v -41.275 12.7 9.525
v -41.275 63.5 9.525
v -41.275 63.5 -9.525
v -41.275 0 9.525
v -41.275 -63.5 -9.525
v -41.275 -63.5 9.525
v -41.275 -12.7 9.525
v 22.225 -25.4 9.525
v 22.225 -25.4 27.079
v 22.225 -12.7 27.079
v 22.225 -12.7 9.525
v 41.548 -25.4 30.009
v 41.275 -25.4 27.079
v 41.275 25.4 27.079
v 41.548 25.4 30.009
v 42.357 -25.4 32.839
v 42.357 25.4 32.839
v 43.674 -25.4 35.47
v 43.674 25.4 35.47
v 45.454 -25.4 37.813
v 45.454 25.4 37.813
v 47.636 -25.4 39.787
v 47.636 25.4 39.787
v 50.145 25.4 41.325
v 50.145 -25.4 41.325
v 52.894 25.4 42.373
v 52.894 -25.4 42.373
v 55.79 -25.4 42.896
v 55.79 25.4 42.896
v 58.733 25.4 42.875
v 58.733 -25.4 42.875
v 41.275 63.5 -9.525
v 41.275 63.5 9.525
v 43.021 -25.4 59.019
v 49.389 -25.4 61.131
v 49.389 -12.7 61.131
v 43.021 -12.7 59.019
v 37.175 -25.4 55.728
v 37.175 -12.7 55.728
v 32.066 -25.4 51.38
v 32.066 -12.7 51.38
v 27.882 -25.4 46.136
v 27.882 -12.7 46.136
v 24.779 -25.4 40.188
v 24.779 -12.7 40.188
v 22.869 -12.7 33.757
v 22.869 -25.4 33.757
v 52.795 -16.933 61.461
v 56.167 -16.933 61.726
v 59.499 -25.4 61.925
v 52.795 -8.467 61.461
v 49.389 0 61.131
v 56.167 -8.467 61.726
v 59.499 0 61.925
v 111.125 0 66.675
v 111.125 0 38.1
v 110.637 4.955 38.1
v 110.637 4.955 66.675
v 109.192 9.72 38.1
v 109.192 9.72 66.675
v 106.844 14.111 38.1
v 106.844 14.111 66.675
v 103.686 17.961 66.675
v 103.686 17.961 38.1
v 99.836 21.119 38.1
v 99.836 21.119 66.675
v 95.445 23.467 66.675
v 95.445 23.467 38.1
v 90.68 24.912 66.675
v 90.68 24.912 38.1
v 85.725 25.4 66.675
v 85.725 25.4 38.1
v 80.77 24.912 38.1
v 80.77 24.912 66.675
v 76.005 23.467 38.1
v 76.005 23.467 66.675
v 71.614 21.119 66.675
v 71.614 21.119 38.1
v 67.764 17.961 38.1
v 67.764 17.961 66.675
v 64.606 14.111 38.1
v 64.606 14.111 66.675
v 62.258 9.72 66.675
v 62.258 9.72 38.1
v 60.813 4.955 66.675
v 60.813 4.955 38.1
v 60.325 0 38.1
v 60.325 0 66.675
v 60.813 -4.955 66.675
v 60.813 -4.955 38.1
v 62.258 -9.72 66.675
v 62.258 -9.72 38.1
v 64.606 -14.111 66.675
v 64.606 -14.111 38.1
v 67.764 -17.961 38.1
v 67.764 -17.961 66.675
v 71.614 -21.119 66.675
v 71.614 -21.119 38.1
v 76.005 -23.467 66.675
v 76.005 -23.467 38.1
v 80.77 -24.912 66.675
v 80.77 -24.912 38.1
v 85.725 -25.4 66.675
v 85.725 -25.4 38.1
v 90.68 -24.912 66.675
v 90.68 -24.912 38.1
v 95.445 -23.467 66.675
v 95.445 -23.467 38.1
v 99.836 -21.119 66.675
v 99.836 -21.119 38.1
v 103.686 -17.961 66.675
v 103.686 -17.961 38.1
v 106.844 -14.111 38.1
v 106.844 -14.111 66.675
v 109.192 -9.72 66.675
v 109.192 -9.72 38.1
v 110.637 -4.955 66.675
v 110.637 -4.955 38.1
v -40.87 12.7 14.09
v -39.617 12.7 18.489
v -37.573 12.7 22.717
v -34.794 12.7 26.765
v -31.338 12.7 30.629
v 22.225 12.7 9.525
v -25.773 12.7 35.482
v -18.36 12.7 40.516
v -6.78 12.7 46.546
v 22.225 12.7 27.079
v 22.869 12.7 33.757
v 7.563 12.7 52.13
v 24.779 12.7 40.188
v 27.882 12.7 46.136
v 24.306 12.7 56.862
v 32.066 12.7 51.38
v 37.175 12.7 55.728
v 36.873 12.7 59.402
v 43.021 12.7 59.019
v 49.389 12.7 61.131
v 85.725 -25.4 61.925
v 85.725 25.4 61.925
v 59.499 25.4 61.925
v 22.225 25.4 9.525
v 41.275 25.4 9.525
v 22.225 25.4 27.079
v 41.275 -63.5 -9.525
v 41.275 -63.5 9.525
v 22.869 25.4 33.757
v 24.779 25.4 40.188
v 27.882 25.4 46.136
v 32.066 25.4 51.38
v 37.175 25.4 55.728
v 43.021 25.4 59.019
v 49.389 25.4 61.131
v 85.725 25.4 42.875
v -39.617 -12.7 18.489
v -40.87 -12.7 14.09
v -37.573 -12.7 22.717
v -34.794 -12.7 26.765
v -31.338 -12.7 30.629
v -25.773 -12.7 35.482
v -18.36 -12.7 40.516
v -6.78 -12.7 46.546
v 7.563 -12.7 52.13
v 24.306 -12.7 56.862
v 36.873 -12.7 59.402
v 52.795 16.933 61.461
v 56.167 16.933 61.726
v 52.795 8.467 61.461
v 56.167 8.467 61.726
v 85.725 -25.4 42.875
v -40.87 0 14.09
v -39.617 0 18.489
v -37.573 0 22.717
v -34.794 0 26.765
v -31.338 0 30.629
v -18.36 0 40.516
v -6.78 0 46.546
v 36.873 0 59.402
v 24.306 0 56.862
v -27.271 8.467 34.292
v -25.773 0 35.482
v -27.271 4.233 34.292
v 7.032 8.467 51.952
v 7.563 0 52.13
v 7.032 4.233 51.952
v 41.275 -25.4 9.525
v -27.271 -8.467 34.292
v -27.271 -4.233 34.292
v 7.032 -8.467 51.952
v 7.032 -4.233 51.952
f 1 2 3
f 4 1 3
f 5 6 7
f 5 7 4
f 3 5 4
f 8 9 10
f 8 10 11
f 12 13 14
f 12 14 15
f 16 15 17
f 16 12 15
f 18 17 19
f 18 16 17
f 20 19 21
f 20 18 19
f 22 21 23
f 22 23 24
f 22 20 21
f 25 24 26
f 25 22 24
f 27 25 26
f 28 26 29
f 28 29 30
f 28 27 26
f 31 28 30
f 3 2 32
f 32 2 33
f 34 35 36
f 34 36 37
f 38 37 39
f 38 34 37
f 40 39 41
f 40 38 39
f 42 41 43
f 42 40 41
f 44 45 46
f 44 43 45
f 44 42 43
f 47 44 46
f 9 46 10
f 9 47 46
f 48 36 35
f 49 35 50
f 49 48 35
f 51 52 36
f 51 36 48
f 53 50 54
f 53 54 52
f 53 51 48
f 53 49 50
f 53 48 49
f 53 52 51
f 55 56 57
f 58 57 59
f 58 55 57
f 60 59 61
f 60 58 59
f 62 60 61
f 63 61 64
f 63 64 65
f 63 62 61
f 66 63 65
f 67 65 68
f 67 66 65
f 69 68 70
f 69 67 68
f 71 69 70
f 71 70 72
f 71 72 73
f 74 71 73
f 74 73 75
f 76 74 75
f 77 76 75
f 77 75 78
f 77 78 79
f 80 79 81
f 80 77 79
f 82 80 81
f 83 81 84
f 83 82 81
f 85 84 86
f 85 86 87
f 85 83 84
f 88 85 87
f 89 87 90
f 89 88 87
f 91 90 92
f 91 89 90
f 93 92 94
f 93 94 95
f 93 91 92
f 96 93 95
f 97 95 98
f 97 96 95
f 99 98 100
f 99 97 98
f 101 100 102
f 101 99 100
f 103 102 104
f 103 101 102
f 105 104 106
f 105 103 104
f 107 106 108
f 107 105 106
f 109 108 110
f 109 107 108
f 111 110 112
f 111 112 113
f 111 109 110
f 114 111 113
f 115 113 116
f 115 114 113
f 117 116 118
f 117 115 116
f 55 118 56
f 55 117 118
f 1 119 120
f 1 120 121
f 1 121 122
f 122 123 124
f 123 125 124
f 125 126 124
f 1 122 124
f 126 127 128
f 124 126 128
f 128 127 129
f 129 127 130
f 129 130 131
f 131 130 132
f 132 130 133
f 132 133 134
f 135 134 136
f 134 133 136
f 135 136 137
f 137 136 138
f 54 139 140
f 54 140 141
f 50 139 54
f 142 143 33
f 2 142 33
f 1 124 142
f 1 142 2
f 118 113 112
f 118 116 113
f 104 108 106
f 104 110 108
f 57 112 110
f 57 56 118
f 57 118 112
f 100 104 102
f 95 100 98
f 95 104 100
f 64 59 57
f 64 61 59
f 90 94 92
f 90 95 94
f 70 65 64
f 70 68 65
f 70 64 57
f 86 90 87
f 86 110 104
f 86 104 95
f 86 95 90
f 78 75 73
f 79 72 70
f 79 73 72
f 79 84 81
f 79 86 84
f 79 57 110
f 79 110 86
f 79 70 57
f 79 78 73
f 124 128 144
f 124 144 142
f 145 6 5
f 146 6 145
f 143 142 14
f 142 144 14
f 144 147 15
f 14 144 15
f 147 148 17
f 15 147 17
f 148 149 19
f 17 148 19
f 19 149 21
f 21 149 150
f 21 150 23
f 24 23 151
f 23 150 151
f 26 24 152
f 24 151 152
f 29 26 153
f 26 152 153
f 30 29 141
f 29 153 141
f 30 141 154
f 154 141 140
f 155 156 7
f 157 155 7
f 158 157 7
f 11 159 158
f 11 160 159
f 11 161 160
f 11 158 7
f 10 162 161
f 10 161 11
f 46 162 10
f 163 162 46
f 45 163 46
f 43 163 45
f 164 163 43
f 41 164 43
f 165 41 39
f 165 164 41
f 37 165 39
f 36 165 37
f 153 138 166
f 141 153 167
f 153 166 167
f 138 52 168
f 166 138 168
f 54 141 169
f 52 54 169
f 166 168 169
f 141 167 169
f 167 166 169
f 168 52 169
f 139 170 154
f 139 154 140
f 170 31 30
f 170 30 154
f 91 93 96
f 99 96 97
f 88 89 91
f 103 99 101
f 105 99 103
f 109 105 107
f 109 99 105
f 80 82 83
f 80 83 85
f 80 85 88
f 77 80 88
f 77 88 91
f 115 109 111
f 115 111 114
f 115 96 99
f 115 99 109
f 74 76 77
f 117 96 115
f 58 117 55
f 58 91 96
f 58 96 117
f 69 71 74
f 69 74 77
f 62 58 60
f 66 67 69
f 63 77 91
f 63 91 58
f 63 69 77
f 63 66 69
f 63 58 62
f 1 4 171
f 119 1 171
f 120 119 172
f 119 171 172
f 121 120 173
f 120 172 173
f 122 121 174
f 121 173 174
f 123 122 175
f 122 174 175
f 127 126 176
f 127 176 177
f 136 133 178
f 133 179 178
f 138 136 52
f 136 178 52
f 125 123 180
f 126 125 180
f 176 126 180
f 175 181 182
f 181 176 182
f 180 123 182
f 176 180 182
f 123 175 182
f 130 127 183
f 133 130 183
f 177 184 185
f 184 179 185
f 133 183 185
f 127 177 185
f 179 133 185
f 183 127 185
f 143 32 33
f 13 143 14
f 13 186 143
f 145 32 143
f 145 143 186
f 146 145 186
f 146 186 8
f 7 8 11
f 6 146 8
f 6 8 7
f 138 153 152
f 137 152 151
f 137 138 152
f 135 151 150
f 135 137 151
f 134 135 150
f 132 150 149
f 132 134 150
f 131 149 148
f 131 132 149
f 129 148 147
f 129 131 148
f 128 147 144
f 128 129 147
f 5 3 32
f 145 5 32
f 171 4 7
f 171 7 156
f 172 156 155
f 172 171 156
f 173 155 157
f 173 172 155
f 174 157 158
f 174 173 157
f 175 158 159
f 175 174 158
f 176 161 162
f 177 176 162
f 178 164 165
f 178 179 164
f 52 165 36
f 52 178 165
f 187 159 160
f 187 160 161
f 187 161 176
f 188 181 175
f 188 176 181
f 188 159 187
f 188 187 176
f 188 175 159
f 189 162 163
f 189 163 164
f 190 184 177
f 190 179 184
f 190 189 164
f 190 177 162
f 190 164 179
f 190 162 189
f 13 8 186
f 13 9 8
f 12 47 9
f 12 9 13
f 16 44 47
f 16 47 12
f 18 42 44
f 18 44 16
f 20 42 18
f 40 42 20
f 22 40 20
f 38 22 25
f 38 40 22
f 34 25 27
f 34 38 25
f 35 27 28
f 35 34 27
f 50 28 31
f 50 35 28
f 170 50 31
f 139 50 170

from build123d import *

# Parameters (mm, degrees)
F1_DEPTH = 63.5
F0_W     = 25.4
F0_H     = 19.05
F2_DEPTH = 25.4
F4_DEPTH = 12.7


with BuildPart() as f1:
    # F0 (on Front) → F1 (new body, symmetric)
    with BuildSketch(Plane.XZ):
        Polygon((41.275, -9.525), (41.275, 9.525), (22.225, 9.525), (-41.275, 9.525), (-41.275, -9.525), align=None)
    extrude(amount=F1_DEPTH, both=True)

    # F0 (on Front) → F2 (join, symmetric)
    with BuildSketch(Plane.XZ):
        with BuildLine():
            Line((22.225, 9.525), (41.275, 9.525))
            Line((41.275, 9.525), (41.275, 27.0792827207))
            ThreePointArc((41.275, 27.0792827207), (46.4989002379, 38.8508458648), (58.732599856, 42.8752))
            Line((58.732599856, 42.8752), (60.325, 42.8752))
            Line((60.325, 42.8752), (60.325, 61.9252))
            Line((60.325, 61.9252), (59.4989729589, 61.9252))
            add(Edge.make_bspline(
                [(49.3886007307, 61.1309538453), (52.8095878961, 61.4934446217), (56.1894289896, 61.7592818595), (59.4989729589, 61.9252)],
                knots=[105.0847680292, 105.0847680292, 105.0847680292, 105.0847680292, 113.5833376247, 113.5833376247, 113.5833376247, 113.5833376247], degree=3))
            ThreePointArc((49.3886007307, 61.1309538453), (29.8477794449, 48.8587312389), (22.225, 27.0792827207))
            Line((22.225, 27.0792827207), (22.225, 9.525))
        make_face()
        with Locations((73.025, 52.4002)):
            Rectangle(F0_W, F0_H)
    extrude(amount=F2_DEPTH, both=True)

    # F0 (on Front) → F4 (join, symmetric)
    with BuildSketch(Plane.XZ):
        with BuildLine():
            Line((-41.275, 9.525), (22.225, 9.525))
            Line((22.225, 9.525), (22.225, 27.0792827207))
            ThreePointArc((22.225, 27.0792827207), (29.8477794449, 48.8587312389), (49.3886007307, 61.1309538453))
            add(Edge.make_bspline(
                [(-41.275, 9.525), (-41.5033258643, 37.3889022144), (7.0881125519, 56.648757315), (49.3886007307, 61.1309538453)],
                knots=[0, 0, 0, 0, 105.0847680292, 105.0847680292, 105.0847680292, 105.0847680292], degree=3))
        make_face()
    extrude(amount=F4_DEPTH, both=True)


with BuildPart() as f3:
    # F0 (on Front) → F3 (revolve)
    with BuildSketch(Plane.XZ):
        Polygon((85.725, 61.9252), (85.725, 42.8752), (85.725, 38.1), (111.125, 38.1), (111.125, 66.675), (85.725, 66.675), align=None)
    revolve(axis=Axis((85.725, 0, 52.3875), (0, 0, 1)))


solid = Compound([f1.part, f3.part])
